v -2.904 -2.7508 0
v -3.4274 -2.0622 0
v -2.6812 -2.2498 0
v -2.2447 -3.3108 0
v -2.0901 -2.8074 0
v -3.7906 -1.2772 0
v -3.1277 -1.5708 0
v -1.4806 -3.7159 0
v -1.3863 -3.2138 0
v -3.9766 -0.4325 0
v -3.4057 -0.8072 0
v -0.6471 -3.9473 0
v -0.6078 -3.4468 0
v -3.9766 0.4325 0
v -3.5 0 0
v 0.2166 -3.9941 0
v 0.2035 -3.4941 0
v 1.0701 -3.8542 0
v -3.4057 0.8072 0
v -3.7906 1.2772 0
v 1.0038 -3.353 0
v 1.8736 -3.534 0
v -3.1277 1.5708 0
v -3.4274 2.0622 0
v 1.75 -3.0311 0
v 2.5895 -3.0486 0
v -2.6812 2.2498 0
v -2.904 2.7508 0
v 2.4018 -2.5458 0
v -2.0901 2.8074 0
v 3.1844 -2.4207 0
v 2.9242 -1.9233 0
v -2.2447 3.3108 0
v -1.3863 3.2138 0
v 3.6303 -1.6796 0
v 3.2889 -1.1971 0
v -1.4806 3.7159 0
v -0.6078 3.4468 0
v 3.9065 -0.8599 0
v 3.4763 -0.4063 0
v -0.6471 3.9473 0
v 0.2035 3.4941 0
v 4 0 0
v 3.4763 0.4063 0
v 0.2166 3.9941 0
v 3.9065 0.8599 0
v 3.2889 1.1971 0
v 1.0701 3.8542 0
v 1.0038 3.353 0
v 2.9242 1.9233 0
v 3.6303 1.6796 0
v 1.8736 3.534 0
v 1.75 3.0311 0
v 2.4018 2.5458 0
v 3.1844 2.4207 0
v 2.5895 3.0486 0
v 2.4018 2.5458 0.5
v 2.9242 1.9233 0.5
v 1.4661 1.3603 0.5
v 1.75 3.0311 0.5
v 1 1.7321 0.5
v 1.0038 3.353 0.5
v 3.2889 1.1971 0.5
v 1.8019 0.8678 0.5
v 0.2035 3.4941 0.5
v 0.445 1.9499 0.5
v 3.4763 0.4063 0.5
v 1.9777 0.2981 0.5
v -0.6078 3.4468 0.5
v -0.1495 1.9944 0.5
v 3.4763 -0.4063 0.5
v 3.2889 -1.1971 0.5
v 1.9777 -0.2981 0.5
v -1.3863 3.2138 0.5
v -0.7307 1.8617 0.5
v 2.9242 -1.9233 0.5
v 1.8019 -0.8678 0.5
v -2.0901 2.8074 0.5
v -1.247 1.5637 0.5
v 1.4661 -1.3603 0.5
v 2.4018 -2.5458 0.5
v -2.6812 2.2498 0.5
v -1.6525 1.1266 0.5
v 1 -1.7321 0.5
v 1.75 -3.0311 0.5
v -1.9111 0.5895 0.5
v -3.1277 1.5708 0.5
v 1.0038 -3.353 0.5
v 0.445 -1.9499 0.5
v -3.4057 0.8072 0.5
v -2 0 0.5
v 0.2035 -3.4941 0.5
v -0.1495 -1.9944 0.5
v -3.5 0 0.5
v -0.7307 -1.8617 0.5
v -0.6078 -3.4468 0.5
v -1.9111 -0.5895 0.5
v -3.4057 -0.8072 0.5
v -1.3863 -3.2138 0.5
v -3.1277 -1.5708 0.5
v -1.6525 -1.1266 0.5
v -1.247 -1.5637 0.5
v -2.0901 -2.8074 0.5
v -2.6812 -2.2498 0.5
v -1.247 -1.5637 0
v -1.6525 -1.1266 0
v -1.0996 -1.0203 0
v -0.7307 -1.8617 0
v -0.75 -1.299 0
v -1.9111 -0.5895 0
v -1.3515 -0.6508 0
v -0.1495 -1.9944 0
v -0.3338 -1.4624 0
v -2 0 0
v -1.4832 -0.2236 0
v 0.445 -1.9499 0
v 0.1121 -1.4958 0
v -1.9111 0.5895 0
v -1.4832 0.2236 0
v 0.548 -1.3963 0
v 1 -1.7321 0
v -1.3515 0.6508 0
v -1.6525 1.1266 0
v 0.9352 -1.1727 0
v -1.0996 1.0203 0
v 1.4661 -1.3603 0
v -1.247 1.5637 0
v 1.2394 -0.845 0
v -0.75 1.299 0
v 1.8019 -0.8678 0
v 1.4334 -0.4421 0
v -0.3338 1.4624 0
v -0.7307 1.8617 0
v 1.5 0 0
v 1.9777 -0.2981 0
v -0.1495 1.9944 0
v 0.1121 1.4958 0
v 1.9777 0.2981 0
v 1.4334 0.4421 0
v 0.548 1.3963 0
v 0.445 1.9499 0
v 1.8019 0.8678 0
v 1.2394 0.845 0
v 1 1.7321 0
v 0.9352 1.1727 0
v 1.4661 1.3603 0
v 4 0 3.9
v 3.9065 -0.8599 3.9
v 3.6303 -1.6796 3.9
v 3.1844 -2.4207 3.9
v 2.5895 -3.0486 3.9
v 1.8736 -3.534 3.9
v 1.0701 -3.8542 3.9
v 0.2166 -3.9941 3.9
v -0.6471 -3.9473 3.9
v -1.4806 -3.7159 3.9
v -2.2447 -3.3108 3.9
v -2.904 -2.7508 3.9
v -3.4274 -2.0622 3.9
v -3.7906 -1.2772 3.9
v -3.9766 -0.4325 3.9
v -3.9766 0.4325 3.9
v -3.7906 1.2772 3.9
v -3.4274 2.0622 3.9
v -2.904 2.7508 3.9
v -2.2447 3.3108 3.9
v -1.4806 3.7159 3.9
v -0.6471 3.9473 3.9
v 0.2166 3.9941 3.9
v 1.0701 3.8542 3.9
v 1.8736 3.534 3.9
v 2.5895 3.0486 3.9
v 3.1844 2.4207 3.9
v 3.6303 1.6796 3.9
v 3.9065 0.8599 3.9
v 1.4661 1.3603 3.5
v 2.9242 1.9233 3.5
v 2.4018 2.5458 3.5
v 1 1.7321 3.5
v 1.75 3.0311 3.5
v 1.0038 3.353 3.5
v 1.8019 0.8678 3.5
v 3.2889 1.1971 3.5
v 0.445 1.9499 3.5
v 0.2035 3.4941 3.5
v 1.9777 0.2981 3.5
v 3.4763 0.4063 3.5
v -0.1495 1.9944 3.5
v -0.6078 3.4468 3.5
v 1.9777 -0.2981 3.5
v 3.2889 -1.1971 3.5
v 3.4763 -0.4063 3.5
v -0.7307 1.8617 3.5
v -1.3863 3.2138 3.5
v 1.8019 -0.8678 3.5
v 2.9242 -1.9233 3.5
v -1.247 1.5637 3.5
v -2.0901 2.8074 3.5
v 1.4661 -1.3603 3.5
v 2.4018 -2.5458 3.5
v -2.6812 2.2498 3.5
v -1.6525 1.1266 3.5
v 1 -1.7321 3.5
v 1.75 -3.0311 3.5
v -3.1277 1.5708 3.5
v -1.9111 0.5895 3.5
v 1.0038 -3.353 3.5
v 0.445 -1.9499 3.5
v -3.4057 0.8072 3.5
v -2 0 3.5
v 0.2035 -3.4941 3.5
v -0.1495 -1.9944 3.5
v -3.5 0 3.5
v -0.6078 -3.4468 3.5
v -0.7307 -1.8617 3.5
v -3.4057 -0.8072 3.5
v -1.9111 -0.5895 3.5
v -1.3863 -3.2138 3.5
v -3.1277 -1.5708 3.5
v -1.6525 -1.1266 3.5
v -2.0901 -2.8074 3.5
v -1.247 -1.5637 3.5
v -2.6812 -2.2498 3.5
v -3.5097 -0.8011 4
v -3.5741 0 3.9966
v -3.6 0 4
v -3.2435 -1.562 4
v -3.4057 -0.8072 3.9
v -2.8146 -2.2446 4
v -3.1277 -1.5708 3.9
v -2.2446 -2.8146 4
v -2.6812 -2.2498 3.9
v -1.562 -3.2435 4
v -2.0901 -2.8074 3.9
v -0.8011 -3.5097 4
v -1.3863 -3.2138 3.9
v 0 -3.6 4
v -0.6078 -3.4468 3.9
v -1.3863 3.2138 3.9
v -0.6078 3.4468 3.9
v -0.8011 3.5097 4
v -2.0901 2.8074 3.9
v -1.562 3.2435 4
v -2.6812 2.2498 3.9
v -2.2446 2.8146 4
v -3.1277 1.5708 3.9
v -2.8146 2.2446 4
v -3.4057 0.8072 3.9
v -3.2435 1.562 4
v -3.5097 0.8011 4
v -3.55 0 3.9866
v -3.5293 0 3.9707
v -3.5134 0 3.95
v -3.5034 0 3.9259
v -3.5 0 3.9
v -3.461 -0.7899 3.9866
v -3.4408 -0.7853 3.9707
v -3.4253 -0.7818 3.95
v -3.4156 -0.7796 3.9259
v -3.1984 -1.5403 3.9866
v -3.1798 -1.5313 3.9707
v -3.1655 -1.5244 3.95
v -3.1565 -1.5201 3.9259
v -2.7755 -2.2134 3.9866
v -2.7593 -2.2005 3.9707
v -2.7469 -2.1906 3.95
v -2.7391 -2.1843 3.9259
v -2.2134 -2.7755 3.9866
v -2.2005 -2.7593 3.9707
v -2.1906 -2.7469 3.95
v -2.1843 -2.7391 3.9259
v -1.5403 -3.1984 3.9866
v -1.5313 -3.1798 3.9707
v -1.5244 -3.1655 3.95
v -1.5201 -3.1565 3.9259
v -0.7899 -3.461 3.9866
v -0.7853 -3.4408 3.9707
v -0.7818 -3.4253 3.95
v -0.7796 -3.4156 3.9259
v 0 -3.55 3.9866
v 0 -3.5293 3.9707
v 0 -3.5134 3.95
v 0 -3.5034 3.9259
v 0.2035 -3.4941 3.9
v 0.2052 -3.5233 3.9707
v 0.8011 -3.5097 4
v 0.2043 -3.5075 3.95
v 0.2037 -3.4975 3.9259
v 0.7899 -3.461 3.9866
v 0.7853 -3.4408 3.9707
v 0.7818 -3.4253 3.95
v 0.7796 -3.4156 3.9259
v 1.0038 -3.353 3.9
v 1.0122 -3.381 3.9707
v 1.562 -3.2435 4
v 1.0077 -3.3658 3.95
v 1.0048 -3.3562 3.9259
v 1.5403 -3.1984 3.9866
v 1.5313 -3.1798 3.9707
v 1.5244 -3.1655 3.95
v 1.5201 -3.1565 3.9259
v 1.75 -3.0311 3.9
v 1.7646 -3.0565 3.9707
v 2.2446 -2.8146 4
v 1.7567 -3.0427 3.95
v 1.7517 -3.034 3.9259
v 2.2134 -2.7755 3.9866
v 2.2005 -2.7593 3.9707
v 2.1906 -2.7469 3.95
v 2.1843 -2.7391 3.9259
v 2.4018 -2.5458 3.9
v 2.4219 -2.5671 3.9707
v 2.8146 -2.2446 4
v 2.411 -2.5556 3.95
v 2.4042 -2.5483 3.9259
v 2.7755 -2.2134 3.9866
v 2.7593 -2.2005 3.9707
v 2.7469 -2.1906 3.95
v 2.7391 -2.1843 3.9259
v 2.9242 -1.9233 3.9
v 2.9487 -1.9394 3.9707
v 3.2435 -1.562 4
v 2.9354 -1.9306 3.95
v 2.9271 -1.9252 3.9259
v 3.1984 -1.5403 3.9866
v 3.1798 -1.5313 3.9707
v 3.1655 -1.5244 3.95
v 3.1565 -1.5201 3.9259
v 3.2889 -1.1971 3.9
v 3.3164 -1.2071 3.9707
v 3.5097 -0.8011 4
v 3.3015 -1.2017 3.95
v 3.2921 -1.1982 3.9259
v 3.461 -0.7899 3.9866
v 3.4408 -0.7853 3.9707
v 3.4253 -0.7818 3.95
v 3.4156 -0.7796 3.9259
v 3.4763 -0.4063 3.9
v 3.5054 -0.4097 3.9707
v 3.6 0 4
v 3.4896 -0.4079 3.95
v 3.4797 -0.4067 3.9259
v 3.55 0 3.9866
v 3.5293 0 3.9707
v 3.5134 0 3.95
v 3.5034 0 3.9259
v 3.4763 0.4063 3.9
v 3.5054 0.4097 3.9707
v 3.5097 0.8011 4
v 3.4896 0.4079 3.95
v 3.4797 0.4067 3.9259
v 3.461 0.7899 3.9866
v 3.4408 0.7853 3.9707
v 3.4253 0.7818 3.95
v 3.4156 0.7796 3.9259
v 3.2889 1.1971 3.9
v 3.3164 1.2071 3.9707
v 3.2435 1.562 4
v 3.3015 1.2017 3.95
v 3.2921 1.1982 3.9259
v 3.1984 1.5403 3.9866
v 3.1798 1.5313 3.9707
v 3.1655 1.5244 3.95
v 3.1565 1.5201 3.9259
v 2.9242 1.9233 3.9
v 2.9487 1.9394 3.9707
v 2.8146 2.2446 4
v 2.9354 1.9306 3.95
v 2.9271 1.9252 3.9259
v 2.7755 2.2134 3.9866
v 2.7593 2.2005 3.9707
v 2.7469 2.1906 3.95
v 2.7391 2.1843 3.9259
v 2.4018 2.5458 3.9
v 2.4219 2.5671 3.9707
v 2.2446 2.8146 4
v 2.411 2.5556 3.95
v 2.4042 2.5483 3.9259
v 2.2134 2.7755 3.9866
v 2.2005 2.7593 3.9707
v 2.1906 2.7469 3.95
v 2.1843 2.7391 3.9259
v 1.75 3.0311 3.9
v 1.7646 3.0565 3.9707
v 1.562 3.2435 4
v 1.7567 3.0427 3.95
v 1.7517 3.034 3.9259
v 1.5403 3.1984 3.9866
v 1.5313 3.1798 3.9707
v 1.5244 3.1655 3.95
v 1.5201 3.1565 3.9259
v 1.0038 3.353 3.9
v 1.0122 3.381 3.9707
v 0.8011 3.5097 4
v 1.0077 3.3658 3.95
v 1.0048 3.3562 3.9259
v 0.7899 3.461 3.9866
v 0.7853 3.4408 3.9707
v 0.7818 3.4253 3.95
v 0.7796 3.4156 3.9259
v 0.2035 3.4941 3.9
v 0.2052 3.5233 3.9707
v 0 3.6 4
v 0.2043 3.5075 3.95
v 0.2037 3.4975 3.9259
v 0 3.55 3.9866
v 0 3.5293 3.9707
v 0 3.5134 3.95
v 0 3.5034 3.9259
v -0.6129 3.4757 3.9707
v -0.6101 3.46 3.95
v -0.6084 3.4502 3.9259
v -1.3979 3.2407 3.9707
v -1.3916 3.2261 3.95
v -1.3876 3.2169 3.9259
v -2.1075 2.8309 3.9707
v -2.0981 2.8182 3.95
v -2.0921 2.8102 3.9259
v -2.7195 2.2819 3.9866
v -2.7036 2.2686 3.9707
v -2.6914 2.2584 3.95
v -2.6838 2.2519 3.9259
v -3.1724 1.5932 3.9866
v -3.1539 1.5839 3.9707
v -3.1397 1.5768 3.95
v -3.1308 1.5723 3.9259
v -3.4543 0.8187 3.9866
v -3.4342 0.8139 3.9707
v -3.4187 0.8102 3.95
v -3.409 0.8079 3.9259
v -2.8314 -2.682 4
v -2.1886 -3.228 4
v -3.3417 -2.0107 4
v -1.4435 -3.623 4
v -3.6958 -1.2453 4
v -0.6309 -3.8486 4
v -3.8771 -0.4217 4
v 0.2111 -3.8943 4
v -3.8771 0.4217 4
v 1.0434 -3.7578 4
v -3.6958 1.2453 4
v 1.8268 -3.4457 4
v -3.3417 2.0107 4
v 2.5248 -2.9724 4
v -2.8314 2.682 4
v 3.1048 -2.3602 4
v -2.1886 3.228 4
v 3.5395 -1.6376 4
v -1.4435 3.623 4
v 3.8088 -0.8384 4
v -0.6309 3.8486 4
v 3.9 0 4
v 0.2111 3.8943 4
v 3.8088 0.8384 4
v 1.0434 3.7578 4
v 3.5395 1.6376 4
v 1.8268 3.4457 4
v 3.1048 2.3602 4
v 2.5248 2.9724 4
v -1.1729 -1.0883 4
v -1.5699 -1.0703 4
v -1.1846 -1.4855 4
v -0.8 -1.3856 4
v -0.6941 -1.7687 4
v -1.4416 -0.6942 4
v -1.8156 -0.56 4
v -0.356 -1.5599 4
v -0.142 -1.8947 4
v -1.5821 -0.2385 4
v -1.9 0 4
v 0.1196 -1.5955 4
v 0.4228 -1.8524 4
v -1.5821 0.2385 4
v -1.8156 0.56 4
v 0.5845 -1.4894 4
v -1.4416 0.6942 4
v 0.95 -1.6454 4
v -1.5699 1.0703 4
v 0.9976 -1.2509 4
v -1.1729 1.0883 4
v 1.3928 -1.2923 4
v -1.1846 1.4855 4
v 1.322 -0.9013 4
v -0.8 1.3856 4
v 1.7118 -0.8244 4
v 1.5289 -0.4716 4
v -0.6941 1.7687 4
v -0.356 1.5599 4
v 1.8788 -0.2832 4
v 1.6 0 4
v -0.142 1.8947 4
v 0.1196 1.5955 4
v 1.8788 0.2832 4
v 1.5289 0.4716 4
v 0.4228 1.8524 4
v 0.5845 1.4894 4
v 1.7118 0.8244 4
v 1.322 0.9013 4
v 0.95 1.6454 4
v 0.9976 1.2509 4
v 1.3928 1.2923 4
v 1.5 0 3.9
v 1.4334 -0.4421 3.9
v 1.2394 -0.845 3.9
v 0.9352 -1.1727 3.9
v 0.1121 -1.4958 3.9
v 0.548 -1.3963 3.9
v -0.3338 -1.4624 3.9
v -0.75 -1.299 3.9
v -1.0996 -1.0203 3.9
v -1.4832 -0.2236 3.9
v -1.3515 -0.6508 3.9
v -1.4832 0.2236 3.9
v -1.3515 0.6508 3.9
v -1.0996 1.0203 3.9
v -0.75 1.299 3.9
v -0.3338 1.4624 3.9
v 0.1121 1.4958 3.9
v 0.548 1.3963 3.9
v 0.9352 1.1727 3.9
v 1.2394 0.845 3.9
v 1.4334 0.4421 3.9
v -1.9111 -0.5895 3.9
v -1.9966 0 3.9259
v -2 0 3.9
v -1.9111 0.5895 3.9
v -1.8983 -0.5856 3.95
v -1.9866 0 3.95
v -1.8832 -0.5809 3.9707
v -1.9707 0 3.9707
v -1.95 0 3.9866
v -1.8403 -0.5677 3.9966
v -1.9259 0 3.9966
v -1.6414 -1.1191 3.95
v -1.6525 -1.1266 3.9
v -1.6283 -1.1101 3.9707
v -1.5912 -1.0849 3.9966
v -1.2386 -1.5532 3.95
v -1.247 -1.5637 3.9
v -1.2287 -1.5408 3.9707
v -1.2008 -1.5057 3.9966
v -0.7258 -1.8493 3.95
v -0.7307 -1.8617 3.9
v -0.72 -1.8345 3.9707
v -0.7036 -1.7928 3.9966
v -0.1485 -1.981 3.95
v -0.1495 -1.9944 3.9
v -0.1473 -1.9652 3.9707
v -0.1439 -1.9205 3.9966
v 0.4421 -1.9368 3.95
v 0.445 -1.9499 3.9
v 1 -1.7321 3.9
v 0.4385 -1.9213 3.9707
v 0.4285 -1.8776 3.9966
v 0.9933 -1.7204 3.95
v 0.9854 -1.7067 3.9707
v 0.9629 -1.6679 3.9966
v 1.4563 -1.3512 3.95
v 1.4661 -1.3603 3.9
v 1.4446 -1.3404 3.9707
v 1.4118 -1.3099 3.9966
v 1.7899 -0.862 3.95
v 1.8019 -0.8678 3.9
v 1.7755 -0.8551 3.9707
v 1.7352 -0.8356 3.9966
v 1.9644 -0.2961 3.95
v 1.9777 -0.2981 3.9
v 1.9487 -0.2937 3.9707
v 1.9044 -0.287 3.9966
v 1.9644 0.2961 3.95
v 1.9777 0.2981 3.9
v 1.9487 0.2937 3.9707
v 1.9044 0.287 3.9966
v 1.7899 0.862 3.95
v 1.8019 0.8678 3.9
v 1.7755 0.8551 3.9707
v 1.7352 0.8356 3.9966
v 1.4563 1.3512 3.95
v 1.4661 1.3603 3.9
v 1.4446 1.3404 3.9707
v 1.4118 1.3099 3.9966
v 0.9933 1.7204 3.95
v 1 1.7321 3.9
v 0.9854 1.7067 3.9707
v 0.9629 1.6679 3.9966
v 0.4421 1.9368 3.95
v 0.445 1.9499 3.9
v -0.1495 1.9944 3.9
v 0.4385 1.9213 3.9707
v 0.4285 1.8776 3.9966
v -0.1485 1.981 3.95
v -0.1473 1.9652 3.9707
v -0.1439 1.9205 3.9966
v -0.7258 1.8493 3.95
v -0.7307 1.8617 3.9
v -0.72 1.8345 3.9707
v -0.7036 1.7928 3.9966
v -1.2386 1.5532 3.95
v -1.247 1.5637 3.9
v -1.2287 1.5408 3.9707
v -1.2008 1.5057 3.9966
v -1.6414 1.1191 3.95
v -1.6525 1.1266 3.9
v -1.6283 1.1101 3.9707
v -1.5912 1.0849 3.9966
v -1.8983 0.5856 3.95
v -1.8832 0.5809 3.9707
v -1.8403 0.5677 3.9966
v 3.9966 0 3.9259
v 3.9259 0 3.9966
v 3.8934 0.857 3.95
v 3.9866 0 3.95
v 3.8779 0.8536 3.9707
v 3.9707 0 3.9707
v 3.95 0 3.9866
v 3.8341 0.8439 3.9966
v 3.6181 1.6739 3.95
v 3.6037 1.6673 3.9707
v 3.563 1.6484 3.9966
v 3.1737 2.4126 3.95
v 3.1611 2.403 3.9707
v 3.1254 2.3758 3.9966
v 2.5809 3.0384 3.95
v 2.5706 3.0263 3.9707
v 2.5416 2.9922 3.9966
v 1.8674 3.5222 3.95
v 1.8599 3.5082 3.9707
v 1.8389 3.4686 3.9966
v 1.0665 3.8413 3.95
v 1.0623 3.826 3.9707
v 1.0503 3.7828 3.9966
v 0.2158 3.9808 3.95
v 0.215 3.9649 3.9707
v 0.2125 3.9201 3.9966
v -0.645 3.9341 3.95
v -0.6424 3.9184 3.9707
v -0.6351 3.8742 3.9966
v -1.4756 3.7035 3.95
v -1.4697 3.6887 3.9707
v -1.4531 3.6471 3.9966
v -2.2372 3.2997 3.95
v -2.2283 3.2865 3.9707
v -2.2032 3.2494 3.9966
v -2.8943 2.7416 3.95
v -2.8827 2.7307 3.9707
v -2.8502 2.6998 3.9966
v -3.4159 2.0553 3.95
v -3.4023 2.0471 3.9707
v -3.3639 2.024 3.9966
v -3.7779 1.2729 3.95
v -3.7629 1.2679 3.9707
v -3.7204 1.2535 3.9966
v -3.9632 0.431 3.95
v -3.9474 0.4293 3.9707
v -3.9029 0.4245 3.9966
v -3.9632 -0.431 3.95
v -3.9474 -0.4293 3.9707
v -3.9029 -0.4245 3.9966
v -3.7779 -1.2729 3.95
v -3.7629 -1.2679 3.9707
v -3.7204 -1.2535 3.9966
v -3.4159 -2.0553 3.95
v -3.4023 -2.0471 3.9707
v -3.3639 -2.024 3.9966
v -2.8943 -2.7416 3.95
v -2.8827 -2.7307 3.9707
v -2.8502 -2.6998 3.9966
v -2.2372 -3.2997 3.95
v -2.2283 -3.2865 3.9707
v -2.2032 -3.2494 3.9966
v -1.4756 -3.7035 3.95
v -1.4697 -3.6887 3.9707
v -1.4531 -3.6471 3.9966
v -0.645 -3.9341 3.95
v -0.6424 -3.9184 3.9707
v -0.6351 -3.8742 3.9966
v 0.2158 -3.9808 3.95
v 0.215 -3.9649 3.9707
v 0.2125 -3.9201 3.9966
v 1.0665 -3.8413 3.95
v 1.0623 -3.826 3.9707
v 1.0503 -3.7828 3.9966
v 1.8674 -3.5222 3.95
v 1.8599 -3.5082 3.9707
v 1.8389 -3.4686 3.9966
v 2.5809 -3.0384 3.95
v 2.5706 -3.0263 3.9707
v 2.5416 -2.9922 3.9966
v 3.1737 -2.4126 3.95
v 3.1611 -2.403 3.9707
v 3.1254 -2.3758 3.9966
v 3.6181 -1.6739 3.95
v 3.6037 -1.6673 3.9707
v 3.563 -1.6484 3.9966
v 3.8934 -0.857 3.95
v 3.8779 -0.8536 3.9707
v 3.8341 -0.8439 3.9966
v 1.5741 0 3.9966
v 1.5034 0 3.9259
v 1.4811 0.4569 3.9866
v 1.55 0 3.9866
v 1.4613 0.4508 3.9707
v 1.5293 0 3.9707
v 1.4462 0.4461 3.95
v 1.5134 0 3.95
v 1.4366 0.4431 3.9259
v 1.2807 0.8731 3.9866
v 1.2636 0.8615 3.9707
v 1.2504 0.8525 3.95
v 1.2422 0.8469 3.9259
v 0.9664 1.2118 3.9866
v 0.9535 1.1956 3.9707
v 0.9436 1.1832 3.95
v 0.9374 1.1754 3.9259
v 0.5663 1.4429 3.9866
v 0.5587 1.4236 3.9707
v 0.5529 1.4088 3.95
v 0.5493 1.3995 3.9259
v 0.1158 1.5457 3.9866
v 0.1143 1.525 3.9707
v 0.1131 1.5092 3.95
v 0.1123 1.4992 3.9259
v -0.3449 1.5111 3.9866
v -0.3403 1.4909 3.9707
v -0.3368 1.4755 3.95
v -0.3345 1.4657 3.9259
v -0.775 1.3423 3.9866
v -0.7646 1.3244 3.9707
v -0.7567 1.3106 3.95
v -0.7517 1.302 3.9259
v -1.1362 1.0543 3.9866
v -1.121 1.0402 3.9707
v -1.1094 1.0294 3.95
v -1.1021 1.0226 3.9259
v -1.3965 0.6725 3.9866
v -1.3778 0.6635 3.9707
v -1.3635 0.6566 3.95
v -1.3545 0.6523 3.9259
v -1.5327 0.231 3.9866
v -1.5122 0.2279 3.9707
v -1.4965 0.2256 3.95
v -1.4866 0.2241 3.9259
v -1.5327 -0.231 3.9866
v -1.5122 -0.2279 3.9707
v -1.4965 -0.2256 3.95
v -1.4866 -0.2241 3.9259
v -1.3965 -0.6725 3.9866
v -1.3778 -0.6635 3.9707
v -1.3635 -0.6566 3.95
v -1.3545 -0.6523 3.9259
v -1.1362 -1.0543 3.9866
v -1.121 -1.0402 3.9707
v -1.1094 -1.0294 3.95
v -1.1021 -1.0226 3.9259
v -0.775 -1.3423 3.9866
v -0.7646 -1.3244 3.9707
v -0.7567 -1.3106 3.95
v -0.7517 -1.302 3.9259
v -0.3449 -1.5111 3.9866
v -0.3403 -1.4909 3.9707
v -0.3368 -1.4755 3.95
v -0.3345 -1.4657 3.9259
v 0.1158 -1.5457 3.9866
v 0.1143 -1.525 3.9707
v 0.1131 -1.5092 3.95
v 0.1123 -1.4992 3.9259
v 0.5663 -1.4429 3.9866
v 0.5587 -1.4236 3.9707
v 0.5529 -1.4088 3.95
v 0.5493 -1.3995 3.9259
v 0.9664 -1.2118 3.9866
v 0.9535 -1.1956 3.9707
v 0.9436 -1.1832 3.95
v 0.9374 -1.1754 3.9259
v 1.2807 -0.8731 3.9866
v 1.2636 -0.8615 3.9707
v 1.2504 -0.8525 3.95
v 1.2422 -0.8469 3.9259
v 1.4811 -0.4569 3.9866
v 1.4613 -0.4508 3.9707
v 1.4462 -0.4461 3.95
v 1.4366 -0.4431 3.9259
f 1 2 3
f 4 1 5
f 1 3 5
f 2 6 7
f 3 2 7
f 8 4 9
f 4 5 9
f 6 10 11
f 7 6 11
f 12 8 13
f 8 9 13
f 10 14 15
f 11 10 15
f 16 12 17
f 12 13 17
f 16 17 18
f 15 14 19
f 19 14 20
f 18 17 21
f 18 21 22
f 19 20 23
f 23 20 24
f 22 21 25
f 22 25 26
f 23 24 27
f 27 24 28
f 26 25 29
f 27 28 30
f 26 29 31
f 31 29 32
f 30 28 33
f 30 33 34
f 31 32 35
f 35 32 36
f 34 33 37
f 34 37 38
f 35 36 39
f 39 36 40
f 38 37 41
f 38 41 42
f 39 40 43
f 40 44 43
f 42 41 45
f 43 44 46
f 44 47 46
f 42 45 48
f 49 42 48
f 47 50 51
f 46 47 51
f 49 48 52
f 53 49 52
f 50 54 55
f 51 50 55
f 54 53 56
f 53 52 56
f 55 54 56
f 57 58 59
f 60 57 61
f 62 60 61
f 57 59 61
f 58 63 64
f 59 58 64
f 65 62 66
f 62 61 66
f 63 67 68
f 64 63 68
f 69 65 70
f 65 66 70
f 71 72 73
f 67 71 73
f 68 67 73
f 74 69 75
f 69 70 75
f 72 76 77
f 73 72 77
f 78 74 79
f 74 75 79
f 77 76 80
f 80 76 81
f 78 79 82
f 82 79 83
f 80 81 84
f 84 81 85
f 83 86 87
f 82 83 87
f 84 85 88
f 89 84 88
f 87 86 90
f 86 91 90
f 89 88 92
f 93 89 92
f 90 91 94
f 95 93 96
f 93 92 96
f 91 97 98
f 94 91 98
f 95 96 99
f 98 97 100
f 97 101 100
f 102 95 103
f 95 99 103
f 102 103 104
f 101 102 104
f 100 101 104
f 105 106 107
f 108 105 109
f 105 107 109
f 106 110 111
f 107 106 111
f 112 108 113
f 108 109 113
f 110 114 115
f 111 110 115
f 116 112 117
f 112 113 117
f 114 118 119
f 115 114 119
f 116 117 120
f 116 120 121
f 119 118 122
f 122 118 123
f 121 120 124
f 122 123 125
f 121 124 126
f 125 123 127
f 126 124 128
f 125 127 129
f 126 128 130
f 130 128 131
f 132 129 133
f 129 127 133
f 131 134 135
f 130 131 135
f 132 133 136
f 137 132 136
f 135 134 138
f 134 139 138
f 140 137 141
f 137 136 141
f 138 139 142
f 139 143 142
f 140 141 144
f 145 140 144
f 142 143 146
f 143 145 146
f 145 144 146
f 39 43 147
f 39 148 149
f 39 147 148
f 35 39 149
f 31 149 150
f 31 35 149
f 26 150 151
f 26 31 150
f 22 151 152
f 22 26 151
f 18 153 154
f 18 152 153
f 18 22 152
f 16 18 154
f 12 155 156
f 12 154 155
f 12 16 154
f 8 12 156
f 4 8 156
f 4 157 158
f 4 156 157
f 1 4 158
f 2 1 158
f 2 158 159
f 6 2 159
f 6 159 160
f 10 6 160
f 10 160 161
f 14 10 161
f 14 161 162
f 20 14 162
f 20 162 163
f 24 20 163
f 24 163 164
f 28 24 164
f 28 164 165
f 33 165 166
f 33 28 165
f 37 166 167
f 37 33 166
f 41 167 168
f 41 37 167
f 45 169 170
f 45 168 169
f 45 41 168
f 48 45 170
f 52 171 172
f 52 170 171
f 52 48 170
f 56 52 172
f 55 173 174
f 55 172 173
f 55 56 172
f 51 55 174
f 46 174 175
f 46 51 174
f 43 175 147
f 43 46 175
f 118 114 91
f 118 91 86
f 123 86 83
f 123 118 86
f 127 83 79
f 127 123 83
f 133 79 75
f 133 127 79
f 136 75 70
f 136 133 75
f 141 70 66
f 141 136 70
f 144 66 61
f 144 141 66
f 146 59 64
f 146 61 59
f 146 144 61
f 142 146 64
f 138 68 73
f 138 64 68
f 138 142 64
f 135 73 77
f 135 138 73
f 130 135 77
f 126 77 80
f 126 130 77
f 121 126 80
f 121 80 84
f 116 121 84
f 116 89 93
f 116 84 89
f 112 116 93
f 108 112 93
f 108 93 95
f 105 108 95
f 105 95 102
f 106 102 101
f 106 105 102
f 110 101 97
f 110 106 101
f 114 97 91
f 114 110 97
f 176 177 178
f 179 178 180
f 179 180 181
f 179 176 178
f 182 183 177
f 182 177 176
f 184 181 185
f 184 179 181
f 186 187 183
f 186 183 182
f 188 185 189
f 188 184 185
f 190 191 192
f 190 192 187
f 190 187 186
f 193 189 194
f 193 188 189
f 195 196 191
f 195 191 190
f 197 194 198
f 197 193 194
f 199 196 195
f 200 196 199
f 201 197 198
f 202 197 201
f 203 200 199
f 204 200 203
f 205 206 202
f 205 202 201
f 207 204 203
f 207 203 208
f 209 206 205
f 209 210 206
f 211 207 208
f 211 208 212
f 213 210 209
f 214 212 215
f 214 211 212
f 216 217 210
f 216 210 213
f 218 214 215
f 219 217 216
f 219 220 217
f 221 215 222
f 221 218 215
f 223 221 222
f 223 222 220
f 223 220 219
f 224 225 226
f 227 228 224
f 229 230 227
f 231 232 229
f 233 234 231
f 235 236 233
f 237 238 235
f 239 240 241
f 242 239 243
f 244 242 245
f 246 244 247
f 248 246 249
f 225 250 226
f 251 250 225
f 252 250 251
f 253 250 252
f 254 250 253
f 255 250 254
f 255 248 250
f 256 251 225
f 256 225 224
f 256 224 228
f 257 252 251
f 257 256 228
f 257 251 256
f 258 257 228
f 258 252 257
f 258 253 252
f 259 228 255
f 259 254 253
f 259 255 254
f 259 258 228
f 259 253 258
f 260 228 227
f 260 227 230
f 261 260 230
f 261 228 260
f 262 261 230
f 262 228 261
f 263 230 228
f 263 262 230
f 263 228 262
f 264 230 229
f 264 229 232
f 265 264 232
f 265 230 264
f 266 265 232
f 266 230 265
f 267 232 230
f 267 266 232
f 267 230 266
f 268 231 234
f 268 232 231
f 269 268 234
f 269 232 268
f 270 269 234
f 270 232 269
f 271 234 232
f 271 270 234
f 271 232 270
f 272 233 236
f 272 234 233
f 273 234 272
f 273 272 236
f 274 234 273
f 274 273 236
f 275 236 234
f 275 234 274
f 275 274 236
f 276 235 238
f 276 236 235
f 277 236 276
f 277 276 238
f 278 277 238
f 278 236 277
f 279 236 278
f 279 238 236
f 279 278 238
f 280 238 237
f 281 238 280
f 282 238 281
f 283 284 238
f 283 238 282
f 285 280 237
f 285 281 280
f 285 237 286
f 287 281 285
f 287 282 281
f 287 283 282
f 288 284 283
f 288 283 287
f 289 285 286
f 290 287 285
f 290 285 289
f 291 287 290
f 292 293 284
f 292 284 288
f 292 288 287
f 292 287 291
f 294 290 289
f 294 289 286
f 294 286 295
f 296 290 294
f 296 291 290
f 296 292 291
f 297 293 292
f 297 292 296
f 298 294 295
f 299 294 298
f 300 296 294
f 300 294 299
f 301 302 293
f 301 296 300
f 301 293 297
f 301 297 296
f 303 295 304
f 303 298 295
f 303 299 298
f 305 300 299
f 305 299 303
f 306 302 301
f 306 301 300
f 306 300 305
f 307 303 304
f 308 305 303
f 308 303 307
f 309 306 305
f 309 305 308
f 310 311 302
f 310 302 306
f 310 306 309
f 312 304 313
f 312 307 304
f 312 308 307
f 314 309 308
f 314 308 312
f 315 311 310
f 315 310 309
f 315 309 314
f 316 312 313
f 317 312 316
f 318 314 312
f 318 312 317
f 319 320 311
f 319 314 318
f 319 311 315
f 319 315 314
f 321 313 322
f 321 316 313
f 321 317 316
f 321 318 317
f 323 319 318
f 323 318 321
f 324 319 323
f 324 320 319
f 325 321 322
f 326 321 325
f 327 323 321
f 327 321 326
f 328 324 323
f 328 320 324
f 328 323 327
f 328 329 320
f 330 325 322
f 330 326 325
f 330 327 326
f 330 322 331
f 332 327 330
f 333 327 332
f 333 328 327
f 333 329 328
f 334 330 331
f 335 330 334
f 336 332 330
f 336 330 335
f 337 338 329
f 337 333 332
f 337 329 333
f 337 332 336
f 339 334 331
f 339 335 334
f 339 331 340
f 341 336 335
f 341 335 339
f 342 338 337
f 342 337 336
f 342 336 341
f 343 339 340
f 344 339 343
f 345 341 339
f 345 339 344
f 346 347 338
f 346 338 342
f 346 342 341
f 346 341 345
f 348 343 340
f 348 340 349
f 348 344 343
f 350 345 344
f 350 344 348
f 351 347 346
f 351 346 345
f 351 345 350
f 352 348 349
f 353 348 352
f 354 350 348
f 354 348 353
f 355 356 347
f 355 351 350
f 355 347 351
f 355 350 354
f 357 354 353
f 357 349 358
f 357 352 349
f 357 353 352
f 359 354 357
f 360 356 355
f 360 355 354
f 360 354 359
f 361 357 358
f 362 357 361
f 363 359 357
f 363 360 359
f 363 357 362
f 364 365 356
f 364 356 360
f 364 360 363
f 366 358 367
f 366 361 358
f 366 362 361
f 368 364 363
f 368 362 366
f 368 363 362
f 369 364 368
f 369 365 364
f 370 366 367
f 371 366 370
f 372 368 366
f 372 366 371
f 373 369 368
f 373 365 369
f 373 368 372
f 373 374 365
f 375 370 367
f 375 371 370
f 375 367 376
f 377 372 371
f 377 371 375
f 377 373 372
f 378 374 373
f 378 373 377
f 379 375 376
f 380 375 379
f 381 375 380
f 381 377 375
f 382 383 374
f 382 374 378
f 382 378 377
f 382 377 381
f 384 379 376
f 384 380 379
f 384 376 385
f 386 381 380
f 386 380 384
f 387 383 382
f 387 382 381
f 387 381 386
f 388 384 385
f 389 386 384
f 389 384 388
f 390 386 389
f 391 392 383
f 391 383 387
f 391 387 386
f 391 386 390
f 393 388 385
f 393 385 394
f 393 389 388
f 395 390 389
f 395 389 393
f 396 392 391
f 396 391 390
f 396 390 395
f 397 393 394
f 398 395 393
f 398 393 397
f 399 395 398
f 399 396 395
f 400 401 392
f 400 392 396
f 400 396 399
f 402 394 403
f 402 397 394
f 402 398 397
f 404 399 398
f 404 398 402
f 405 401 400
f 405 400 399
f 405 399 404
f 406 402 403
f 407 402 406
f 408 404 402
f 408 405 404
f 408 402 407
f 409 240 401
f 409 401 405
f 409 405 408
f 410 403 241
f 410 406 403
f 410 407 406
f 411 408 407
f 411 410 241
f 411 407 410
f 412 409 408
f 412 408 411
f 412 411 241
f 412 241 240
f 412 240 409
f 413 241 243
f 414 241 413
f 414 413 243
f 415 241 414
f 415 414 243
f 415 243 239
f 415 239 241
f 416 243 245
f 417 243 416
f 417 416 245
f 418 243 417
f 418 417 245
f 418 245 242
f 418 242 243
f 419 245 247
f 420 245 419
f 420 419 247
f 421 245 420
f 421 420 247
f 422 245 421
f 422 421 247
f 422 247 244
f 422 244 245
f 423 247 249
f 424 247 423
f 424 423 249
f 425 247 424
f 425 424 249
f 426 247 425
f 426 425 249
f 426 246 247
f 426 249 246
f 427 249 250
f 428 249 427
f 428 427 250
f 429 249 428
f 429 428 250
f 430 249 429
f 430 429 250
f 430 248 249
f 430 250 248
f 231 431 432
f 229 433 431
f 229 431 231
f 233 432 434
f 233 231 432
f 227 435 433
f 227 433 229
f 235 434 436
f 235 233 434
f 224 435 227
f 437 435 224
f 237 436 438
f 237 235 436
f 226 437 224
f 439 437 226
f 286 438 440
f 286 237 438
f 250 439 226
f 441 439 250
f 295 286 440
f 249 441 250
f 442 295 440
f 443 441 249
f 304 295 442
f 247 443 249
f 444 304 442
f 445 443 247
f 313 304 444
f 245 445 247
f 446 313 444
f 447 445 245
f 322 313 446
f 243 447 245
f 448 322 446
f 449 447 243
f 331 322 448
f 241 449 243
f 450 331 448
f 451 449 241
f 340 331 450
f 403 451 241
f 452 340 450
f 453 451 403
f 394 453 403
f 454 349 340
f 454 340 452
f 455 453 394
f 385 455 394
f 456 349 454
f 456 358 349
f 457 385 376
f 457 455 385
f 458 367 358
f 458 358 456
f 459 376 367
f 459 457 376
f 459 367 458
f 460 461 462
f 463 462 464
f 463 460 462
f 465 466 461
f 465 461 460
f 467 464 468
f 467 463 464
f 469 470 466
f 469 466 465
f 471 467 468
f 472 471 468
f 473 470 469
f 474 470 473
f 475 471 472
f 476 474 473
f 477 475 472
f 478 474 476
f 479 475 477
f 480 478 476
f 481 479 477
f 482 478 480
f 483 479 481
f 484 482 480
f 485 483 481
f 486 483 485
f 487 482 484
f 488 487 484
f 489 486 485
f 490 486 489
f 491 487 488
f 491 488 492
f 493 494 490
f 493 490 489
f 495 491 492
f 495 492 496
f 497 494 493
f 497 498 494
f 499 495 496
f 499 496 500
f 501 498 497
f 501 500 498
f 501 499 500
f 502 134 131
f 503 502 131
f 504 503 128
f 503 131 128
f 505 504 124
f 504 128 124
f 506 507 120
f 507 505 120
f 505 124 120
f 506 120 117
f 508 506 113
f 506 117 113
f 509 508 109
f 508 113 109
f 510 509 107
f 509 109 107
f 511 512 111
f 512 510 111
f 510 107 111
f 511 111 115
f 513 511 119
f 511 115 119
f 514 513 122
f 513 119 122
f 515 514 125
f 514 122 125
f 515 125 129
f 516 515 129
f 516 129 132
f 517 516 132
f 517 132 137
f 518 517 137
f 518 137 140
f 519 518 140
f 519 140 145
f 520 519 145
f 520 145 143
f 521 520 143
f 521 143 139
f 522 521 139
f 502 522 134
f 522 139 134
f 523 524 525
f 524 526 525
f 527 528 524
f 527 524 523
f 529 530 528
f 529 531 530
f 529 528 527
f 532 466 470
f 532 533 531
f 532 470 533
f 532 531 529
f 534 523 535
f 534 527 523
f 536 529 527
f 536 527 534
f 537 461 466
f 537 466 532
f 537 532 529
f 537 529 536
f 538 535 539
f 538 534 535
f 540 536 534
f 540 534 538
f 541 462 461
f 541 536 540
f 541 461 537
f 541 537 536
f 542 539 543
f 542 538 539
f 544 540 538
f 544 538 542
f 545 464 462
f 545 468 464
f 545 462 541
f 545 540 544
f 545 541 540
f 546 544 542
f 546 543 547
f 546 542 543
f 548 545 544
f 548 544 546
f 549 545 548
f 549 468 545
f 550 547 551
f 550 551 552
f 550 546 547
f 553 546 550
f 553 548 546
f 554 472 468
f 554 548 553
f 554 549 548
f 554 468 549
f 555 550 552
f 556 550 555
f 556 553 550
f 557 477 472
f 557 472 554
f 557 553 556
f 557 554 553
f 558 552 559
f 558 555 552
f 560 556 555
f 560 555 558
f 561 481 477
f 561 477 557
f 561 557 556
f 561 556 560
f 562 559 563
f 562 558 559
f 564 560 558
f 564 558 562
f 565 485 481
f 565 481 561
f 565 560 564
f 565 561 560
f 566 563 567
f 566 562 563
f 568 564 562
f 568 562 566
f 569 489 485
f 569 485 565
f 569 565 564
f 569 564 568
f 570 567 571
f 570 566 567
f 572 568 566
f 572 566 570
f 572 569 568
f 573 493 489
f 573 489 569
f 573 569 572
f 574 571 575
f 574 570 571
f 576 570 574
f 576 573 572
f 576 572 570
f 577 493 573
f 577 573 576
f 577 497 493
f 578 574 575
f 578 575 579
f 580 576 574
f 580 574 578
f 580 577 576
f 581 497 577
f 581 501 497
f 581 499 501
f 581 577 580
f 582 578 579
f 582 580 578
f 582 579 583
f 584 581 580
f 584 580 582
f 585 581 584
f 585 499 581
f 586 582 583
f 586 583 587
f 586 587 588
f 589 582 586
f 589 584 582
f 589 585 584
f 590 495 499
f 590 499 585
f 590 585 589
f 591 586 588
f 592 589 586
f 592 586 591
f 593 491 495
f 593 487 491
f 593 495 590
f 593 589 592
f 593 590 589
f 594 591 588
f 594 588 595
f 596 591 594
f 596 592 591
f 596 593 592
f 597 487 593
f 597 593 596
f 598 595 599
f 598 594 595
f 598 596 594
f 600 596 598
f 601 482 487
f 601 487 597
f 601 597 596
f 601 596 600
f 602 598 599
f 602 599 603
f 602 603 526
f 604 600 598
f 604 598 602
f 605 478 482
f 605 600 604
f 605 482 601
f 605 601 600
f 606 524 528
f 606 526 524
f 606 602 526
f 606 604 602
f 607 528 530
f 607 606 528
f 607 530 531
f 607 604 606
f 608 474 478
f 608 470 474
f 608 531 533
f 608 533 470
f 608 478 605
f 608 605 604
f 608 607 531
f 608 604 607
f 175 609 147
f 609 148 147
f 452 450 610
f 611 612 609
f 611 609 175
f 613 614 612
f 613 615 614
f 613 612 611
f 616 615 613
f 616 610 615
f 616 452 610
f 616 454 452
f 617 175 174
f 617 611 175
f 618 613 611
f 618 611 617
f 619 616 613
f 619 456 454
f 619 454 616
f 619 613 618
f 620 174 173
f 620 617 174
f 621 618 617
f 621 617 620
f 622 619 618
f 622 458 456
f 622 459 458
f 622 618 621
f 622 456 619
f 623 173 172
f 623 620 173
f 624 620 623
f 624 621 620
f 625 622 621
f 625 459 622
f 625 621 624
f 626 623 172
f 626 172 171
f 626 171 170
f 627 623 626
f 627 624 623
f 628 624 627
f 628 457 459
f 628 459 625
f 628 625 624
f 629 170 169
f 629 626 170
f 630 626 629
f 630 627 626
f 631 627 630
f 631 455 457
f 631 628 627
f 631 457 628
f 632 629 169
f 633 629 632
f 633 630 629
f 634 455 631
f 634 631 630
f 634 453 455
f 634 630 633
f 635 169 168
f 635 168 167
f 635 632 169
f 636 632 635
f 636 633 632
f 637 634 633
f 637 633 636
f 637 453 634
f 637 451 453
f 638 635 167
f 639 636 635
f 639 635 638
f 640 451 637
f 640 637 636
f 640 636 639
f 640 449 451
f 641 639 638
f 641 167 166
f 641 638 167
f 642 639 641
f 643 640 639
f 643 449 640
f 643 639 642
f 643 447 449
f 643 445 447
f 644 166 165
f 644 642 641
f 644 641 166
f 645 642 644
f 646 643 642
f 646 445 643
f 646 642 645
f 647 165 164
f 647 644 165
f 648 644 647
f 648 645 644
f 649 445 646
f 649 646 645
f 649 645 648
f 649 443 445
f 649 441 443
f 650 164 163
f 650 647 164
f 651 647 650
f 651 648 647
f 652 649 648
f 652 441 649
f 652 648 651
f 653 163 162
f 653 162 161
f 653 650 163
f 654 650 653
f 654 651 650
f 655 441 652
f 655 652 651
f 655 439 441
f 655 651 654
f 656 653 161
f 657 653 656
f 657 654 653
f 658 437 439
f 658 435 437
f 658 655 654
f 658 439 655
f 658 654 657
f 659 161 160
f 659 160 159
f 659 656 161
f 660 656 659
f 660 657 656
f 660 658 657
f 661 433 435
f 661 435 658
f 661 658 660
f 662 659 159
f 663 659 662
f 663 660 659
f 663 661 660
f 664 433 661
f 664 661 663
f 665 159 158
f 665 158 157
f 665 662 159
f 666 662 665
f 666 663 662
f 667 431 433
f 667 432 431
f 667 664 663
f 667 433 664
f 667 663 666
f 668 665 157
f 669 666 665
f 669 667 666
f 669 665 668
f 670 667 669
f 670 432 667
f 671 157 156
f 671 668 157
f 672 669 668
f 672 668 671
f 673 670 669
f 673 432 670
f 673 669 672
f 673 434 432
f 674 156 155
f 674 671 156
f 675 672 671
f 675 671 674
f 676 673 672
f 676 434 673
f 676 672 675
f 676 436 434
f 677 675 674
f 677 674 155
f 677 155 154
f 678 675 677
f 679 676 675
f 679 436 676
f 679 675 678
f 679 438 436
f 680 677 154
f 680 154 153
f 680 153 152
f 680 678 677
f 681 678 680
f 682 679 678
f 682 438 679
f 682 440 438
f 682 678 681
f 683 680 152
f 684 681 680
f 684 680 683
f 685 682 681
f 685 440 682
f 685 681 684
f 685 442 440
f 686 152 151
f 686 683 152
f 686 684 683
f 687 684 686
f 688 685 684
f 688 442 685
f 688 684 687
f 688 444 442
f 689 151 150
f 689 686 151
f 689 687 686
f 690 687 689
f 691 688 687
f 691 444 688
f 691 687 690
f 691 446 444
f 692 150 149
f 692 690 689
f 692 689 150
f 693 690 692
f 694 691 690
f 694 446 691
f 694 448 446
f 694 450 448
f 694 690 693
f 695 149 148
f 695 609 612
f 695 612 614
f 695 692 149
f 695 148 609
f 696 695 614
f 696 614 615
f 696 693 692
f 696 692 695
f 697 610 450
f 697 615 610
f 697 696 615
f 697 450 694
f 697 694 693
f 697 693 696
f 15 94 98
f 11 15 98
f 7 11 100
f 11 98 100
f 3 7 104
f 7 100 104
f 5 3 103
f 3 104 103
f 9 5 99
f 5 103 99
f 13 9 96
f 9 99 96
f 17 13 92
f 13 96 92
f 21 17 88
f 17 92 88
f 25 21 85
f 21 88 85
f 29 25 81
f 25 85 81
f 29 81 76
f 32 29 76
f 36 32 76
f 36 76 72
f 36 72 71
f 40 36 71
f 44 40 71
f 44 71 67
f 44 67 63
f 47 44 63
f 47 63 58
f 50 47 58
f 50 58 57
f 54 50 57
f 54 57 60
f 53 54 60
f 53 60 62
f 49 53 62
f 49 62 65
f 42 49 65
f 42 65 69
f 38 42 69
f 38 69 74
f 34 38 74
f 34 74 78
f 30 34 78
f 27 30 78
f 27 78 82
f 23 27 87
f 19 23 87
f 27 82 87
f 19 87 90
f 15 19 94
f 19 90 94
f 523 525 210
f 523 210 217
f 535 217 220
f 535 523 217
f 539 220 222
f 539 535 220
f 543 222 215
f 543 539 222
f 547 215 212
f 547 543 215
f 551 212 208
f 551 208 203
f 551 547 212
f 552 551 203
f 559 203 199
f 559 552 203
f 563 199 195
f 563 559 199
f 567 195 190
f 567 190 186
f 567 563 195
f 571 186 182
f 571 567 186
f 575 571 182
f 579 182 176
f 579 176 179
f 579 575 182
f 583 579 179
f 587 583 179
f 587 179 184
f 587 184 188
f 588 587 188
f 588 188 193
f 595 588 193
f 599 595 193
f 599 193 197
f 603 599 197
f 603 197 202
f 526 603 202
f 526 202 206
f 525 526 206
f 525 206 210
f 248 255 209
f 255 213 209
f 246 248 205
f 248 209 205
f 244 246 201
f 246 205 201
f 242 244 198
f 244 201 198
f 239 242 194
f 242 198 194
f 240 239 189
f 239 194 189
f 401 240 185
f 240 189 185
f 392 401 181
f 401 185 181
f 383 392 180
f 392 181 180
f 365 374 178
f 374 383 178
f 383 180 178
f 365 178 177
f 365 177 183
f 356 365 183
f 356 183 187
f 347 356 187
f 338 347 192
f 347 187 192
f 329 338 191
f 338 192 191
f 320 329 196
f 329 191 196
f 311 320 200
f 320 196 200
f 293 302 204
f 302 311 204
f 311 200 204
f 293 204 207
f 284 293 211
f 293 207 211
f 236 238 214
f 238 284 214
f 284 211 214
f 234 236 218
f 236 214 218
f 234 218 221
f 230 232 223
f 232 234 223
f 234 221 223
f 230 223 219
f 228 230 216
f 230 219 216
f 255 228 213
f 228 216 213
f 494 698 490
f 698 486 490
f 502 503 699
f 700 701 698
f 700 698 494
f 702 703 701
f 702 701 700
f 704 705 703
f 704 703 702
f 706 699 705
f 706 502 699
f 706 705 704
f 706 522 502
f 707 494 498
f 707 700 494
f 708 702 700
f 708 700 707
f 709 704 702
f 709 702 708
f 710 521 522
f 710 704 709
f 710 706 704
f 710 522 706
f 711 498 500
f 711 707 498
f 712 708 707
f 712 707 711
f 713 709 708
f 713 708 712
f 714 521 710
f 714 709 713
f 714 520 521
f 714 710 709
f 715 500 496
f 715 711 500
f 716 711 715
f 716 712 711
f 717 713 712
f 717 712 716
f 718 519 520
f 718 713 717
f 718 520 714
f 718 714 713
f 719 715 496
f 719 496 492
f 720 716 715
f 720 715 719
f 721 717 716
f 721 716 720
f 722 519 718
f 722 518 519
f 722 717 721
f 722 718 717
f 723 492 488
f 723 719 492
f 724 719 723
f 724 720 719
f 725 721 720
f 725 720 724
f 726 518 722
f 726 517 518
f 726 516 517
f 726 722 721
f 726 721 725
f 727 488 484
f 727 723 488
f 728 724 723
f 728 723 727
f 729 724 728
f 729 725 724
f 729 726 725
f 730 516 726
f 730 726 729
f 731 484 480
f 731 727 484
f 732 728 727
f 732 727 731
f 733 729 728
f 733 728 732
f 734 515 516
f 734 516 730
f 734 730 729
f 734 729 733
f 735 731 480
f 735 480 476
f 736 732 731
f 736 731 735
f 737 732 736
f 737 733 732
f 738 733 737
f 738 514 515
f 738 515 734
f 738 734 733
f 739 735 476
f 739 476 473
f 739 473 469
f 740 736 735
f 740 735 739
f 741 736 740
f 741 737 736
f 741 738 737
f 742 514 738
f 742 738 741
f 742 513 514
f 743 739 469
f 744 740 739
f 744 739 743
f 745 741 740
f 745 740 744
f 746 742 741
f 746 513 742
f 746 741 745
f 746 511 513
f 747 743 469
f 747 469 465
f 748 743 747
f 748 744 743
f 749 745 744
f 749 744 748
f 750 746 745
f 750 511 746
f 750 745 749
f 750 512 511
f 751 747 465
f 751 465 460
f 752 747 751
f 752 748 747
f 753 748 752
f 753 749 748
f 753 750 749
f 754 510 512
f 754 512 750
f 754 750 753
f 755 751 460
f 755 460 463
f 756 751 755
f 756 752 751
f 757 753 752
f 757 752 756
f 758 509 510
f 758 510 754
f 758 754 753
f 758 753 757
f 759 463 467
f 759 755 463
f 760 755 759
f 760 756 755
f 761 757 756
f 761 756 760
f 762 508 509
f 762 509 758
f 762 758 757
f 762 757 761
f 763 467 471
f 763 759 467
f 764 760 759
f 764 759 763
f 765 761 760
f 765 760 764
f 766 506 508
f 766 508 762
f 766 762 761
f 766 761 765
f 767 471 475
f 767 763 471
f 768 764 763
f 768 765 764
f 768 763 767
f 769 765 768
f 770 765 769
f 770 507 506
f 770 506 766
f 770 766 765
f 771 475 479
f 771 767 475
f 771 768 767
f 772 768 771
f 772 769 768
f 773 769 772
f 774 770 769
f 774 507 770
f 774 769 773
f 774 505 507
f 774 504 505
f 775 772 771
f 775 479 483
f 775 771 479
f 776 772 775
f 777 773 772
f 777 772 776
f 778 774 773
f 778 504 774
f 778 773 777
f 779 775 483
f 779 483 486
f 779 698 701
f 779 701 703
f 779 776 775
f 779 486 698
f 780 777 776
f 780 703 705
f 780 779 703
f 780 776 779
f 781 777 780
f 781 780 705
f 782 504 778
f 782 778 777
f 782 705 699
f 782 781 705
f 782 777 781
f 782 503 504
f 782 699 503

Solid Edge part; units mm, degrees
sketch "Sketch1" plane through (0, 0, 0) normal (0, 0, 1) x (1, 0, 0)
  circle A0 centre (0, 0) radius 1.5
  circle A1 centre (0, 0) radius 4
extrude "Protrusion1" add sketch "Sketch1" along normal blind 4
sketch "Sketch2" plane through (0, 0, 0) normal (0, -1, 0) x (1, 0, 0)
  line L0 (-3.5, 4) -> (-2, 4)
  line L1 (-2, 3.5) -> (-2, 4)
  line L2 (-3.5, 3.5) -> (-2, 3.5)
  line L3 (-3.5, 4) -> (-3.5, 3.5)
  line L4 (-3.5, 0) -> (-2, 0)
  line L5 (-2, 0.5) -> (-2, 0)
  line L6 (-3.5, 0.5) -> (-2, 0.5)
  line L7 (-3.5, 0) -> (-3.5, 0.5)
revolve "RevolvedCutout1" cut sketch "Sketch2" angle 360 about axis through (0, 0, 0) along (0, 0, 1)
fillet "Round_1" radius 0.1 4 edges at (2, 0, 4) (-1.5, 0, 4) (3.5, 0, 4) (-4, 0, 4)
